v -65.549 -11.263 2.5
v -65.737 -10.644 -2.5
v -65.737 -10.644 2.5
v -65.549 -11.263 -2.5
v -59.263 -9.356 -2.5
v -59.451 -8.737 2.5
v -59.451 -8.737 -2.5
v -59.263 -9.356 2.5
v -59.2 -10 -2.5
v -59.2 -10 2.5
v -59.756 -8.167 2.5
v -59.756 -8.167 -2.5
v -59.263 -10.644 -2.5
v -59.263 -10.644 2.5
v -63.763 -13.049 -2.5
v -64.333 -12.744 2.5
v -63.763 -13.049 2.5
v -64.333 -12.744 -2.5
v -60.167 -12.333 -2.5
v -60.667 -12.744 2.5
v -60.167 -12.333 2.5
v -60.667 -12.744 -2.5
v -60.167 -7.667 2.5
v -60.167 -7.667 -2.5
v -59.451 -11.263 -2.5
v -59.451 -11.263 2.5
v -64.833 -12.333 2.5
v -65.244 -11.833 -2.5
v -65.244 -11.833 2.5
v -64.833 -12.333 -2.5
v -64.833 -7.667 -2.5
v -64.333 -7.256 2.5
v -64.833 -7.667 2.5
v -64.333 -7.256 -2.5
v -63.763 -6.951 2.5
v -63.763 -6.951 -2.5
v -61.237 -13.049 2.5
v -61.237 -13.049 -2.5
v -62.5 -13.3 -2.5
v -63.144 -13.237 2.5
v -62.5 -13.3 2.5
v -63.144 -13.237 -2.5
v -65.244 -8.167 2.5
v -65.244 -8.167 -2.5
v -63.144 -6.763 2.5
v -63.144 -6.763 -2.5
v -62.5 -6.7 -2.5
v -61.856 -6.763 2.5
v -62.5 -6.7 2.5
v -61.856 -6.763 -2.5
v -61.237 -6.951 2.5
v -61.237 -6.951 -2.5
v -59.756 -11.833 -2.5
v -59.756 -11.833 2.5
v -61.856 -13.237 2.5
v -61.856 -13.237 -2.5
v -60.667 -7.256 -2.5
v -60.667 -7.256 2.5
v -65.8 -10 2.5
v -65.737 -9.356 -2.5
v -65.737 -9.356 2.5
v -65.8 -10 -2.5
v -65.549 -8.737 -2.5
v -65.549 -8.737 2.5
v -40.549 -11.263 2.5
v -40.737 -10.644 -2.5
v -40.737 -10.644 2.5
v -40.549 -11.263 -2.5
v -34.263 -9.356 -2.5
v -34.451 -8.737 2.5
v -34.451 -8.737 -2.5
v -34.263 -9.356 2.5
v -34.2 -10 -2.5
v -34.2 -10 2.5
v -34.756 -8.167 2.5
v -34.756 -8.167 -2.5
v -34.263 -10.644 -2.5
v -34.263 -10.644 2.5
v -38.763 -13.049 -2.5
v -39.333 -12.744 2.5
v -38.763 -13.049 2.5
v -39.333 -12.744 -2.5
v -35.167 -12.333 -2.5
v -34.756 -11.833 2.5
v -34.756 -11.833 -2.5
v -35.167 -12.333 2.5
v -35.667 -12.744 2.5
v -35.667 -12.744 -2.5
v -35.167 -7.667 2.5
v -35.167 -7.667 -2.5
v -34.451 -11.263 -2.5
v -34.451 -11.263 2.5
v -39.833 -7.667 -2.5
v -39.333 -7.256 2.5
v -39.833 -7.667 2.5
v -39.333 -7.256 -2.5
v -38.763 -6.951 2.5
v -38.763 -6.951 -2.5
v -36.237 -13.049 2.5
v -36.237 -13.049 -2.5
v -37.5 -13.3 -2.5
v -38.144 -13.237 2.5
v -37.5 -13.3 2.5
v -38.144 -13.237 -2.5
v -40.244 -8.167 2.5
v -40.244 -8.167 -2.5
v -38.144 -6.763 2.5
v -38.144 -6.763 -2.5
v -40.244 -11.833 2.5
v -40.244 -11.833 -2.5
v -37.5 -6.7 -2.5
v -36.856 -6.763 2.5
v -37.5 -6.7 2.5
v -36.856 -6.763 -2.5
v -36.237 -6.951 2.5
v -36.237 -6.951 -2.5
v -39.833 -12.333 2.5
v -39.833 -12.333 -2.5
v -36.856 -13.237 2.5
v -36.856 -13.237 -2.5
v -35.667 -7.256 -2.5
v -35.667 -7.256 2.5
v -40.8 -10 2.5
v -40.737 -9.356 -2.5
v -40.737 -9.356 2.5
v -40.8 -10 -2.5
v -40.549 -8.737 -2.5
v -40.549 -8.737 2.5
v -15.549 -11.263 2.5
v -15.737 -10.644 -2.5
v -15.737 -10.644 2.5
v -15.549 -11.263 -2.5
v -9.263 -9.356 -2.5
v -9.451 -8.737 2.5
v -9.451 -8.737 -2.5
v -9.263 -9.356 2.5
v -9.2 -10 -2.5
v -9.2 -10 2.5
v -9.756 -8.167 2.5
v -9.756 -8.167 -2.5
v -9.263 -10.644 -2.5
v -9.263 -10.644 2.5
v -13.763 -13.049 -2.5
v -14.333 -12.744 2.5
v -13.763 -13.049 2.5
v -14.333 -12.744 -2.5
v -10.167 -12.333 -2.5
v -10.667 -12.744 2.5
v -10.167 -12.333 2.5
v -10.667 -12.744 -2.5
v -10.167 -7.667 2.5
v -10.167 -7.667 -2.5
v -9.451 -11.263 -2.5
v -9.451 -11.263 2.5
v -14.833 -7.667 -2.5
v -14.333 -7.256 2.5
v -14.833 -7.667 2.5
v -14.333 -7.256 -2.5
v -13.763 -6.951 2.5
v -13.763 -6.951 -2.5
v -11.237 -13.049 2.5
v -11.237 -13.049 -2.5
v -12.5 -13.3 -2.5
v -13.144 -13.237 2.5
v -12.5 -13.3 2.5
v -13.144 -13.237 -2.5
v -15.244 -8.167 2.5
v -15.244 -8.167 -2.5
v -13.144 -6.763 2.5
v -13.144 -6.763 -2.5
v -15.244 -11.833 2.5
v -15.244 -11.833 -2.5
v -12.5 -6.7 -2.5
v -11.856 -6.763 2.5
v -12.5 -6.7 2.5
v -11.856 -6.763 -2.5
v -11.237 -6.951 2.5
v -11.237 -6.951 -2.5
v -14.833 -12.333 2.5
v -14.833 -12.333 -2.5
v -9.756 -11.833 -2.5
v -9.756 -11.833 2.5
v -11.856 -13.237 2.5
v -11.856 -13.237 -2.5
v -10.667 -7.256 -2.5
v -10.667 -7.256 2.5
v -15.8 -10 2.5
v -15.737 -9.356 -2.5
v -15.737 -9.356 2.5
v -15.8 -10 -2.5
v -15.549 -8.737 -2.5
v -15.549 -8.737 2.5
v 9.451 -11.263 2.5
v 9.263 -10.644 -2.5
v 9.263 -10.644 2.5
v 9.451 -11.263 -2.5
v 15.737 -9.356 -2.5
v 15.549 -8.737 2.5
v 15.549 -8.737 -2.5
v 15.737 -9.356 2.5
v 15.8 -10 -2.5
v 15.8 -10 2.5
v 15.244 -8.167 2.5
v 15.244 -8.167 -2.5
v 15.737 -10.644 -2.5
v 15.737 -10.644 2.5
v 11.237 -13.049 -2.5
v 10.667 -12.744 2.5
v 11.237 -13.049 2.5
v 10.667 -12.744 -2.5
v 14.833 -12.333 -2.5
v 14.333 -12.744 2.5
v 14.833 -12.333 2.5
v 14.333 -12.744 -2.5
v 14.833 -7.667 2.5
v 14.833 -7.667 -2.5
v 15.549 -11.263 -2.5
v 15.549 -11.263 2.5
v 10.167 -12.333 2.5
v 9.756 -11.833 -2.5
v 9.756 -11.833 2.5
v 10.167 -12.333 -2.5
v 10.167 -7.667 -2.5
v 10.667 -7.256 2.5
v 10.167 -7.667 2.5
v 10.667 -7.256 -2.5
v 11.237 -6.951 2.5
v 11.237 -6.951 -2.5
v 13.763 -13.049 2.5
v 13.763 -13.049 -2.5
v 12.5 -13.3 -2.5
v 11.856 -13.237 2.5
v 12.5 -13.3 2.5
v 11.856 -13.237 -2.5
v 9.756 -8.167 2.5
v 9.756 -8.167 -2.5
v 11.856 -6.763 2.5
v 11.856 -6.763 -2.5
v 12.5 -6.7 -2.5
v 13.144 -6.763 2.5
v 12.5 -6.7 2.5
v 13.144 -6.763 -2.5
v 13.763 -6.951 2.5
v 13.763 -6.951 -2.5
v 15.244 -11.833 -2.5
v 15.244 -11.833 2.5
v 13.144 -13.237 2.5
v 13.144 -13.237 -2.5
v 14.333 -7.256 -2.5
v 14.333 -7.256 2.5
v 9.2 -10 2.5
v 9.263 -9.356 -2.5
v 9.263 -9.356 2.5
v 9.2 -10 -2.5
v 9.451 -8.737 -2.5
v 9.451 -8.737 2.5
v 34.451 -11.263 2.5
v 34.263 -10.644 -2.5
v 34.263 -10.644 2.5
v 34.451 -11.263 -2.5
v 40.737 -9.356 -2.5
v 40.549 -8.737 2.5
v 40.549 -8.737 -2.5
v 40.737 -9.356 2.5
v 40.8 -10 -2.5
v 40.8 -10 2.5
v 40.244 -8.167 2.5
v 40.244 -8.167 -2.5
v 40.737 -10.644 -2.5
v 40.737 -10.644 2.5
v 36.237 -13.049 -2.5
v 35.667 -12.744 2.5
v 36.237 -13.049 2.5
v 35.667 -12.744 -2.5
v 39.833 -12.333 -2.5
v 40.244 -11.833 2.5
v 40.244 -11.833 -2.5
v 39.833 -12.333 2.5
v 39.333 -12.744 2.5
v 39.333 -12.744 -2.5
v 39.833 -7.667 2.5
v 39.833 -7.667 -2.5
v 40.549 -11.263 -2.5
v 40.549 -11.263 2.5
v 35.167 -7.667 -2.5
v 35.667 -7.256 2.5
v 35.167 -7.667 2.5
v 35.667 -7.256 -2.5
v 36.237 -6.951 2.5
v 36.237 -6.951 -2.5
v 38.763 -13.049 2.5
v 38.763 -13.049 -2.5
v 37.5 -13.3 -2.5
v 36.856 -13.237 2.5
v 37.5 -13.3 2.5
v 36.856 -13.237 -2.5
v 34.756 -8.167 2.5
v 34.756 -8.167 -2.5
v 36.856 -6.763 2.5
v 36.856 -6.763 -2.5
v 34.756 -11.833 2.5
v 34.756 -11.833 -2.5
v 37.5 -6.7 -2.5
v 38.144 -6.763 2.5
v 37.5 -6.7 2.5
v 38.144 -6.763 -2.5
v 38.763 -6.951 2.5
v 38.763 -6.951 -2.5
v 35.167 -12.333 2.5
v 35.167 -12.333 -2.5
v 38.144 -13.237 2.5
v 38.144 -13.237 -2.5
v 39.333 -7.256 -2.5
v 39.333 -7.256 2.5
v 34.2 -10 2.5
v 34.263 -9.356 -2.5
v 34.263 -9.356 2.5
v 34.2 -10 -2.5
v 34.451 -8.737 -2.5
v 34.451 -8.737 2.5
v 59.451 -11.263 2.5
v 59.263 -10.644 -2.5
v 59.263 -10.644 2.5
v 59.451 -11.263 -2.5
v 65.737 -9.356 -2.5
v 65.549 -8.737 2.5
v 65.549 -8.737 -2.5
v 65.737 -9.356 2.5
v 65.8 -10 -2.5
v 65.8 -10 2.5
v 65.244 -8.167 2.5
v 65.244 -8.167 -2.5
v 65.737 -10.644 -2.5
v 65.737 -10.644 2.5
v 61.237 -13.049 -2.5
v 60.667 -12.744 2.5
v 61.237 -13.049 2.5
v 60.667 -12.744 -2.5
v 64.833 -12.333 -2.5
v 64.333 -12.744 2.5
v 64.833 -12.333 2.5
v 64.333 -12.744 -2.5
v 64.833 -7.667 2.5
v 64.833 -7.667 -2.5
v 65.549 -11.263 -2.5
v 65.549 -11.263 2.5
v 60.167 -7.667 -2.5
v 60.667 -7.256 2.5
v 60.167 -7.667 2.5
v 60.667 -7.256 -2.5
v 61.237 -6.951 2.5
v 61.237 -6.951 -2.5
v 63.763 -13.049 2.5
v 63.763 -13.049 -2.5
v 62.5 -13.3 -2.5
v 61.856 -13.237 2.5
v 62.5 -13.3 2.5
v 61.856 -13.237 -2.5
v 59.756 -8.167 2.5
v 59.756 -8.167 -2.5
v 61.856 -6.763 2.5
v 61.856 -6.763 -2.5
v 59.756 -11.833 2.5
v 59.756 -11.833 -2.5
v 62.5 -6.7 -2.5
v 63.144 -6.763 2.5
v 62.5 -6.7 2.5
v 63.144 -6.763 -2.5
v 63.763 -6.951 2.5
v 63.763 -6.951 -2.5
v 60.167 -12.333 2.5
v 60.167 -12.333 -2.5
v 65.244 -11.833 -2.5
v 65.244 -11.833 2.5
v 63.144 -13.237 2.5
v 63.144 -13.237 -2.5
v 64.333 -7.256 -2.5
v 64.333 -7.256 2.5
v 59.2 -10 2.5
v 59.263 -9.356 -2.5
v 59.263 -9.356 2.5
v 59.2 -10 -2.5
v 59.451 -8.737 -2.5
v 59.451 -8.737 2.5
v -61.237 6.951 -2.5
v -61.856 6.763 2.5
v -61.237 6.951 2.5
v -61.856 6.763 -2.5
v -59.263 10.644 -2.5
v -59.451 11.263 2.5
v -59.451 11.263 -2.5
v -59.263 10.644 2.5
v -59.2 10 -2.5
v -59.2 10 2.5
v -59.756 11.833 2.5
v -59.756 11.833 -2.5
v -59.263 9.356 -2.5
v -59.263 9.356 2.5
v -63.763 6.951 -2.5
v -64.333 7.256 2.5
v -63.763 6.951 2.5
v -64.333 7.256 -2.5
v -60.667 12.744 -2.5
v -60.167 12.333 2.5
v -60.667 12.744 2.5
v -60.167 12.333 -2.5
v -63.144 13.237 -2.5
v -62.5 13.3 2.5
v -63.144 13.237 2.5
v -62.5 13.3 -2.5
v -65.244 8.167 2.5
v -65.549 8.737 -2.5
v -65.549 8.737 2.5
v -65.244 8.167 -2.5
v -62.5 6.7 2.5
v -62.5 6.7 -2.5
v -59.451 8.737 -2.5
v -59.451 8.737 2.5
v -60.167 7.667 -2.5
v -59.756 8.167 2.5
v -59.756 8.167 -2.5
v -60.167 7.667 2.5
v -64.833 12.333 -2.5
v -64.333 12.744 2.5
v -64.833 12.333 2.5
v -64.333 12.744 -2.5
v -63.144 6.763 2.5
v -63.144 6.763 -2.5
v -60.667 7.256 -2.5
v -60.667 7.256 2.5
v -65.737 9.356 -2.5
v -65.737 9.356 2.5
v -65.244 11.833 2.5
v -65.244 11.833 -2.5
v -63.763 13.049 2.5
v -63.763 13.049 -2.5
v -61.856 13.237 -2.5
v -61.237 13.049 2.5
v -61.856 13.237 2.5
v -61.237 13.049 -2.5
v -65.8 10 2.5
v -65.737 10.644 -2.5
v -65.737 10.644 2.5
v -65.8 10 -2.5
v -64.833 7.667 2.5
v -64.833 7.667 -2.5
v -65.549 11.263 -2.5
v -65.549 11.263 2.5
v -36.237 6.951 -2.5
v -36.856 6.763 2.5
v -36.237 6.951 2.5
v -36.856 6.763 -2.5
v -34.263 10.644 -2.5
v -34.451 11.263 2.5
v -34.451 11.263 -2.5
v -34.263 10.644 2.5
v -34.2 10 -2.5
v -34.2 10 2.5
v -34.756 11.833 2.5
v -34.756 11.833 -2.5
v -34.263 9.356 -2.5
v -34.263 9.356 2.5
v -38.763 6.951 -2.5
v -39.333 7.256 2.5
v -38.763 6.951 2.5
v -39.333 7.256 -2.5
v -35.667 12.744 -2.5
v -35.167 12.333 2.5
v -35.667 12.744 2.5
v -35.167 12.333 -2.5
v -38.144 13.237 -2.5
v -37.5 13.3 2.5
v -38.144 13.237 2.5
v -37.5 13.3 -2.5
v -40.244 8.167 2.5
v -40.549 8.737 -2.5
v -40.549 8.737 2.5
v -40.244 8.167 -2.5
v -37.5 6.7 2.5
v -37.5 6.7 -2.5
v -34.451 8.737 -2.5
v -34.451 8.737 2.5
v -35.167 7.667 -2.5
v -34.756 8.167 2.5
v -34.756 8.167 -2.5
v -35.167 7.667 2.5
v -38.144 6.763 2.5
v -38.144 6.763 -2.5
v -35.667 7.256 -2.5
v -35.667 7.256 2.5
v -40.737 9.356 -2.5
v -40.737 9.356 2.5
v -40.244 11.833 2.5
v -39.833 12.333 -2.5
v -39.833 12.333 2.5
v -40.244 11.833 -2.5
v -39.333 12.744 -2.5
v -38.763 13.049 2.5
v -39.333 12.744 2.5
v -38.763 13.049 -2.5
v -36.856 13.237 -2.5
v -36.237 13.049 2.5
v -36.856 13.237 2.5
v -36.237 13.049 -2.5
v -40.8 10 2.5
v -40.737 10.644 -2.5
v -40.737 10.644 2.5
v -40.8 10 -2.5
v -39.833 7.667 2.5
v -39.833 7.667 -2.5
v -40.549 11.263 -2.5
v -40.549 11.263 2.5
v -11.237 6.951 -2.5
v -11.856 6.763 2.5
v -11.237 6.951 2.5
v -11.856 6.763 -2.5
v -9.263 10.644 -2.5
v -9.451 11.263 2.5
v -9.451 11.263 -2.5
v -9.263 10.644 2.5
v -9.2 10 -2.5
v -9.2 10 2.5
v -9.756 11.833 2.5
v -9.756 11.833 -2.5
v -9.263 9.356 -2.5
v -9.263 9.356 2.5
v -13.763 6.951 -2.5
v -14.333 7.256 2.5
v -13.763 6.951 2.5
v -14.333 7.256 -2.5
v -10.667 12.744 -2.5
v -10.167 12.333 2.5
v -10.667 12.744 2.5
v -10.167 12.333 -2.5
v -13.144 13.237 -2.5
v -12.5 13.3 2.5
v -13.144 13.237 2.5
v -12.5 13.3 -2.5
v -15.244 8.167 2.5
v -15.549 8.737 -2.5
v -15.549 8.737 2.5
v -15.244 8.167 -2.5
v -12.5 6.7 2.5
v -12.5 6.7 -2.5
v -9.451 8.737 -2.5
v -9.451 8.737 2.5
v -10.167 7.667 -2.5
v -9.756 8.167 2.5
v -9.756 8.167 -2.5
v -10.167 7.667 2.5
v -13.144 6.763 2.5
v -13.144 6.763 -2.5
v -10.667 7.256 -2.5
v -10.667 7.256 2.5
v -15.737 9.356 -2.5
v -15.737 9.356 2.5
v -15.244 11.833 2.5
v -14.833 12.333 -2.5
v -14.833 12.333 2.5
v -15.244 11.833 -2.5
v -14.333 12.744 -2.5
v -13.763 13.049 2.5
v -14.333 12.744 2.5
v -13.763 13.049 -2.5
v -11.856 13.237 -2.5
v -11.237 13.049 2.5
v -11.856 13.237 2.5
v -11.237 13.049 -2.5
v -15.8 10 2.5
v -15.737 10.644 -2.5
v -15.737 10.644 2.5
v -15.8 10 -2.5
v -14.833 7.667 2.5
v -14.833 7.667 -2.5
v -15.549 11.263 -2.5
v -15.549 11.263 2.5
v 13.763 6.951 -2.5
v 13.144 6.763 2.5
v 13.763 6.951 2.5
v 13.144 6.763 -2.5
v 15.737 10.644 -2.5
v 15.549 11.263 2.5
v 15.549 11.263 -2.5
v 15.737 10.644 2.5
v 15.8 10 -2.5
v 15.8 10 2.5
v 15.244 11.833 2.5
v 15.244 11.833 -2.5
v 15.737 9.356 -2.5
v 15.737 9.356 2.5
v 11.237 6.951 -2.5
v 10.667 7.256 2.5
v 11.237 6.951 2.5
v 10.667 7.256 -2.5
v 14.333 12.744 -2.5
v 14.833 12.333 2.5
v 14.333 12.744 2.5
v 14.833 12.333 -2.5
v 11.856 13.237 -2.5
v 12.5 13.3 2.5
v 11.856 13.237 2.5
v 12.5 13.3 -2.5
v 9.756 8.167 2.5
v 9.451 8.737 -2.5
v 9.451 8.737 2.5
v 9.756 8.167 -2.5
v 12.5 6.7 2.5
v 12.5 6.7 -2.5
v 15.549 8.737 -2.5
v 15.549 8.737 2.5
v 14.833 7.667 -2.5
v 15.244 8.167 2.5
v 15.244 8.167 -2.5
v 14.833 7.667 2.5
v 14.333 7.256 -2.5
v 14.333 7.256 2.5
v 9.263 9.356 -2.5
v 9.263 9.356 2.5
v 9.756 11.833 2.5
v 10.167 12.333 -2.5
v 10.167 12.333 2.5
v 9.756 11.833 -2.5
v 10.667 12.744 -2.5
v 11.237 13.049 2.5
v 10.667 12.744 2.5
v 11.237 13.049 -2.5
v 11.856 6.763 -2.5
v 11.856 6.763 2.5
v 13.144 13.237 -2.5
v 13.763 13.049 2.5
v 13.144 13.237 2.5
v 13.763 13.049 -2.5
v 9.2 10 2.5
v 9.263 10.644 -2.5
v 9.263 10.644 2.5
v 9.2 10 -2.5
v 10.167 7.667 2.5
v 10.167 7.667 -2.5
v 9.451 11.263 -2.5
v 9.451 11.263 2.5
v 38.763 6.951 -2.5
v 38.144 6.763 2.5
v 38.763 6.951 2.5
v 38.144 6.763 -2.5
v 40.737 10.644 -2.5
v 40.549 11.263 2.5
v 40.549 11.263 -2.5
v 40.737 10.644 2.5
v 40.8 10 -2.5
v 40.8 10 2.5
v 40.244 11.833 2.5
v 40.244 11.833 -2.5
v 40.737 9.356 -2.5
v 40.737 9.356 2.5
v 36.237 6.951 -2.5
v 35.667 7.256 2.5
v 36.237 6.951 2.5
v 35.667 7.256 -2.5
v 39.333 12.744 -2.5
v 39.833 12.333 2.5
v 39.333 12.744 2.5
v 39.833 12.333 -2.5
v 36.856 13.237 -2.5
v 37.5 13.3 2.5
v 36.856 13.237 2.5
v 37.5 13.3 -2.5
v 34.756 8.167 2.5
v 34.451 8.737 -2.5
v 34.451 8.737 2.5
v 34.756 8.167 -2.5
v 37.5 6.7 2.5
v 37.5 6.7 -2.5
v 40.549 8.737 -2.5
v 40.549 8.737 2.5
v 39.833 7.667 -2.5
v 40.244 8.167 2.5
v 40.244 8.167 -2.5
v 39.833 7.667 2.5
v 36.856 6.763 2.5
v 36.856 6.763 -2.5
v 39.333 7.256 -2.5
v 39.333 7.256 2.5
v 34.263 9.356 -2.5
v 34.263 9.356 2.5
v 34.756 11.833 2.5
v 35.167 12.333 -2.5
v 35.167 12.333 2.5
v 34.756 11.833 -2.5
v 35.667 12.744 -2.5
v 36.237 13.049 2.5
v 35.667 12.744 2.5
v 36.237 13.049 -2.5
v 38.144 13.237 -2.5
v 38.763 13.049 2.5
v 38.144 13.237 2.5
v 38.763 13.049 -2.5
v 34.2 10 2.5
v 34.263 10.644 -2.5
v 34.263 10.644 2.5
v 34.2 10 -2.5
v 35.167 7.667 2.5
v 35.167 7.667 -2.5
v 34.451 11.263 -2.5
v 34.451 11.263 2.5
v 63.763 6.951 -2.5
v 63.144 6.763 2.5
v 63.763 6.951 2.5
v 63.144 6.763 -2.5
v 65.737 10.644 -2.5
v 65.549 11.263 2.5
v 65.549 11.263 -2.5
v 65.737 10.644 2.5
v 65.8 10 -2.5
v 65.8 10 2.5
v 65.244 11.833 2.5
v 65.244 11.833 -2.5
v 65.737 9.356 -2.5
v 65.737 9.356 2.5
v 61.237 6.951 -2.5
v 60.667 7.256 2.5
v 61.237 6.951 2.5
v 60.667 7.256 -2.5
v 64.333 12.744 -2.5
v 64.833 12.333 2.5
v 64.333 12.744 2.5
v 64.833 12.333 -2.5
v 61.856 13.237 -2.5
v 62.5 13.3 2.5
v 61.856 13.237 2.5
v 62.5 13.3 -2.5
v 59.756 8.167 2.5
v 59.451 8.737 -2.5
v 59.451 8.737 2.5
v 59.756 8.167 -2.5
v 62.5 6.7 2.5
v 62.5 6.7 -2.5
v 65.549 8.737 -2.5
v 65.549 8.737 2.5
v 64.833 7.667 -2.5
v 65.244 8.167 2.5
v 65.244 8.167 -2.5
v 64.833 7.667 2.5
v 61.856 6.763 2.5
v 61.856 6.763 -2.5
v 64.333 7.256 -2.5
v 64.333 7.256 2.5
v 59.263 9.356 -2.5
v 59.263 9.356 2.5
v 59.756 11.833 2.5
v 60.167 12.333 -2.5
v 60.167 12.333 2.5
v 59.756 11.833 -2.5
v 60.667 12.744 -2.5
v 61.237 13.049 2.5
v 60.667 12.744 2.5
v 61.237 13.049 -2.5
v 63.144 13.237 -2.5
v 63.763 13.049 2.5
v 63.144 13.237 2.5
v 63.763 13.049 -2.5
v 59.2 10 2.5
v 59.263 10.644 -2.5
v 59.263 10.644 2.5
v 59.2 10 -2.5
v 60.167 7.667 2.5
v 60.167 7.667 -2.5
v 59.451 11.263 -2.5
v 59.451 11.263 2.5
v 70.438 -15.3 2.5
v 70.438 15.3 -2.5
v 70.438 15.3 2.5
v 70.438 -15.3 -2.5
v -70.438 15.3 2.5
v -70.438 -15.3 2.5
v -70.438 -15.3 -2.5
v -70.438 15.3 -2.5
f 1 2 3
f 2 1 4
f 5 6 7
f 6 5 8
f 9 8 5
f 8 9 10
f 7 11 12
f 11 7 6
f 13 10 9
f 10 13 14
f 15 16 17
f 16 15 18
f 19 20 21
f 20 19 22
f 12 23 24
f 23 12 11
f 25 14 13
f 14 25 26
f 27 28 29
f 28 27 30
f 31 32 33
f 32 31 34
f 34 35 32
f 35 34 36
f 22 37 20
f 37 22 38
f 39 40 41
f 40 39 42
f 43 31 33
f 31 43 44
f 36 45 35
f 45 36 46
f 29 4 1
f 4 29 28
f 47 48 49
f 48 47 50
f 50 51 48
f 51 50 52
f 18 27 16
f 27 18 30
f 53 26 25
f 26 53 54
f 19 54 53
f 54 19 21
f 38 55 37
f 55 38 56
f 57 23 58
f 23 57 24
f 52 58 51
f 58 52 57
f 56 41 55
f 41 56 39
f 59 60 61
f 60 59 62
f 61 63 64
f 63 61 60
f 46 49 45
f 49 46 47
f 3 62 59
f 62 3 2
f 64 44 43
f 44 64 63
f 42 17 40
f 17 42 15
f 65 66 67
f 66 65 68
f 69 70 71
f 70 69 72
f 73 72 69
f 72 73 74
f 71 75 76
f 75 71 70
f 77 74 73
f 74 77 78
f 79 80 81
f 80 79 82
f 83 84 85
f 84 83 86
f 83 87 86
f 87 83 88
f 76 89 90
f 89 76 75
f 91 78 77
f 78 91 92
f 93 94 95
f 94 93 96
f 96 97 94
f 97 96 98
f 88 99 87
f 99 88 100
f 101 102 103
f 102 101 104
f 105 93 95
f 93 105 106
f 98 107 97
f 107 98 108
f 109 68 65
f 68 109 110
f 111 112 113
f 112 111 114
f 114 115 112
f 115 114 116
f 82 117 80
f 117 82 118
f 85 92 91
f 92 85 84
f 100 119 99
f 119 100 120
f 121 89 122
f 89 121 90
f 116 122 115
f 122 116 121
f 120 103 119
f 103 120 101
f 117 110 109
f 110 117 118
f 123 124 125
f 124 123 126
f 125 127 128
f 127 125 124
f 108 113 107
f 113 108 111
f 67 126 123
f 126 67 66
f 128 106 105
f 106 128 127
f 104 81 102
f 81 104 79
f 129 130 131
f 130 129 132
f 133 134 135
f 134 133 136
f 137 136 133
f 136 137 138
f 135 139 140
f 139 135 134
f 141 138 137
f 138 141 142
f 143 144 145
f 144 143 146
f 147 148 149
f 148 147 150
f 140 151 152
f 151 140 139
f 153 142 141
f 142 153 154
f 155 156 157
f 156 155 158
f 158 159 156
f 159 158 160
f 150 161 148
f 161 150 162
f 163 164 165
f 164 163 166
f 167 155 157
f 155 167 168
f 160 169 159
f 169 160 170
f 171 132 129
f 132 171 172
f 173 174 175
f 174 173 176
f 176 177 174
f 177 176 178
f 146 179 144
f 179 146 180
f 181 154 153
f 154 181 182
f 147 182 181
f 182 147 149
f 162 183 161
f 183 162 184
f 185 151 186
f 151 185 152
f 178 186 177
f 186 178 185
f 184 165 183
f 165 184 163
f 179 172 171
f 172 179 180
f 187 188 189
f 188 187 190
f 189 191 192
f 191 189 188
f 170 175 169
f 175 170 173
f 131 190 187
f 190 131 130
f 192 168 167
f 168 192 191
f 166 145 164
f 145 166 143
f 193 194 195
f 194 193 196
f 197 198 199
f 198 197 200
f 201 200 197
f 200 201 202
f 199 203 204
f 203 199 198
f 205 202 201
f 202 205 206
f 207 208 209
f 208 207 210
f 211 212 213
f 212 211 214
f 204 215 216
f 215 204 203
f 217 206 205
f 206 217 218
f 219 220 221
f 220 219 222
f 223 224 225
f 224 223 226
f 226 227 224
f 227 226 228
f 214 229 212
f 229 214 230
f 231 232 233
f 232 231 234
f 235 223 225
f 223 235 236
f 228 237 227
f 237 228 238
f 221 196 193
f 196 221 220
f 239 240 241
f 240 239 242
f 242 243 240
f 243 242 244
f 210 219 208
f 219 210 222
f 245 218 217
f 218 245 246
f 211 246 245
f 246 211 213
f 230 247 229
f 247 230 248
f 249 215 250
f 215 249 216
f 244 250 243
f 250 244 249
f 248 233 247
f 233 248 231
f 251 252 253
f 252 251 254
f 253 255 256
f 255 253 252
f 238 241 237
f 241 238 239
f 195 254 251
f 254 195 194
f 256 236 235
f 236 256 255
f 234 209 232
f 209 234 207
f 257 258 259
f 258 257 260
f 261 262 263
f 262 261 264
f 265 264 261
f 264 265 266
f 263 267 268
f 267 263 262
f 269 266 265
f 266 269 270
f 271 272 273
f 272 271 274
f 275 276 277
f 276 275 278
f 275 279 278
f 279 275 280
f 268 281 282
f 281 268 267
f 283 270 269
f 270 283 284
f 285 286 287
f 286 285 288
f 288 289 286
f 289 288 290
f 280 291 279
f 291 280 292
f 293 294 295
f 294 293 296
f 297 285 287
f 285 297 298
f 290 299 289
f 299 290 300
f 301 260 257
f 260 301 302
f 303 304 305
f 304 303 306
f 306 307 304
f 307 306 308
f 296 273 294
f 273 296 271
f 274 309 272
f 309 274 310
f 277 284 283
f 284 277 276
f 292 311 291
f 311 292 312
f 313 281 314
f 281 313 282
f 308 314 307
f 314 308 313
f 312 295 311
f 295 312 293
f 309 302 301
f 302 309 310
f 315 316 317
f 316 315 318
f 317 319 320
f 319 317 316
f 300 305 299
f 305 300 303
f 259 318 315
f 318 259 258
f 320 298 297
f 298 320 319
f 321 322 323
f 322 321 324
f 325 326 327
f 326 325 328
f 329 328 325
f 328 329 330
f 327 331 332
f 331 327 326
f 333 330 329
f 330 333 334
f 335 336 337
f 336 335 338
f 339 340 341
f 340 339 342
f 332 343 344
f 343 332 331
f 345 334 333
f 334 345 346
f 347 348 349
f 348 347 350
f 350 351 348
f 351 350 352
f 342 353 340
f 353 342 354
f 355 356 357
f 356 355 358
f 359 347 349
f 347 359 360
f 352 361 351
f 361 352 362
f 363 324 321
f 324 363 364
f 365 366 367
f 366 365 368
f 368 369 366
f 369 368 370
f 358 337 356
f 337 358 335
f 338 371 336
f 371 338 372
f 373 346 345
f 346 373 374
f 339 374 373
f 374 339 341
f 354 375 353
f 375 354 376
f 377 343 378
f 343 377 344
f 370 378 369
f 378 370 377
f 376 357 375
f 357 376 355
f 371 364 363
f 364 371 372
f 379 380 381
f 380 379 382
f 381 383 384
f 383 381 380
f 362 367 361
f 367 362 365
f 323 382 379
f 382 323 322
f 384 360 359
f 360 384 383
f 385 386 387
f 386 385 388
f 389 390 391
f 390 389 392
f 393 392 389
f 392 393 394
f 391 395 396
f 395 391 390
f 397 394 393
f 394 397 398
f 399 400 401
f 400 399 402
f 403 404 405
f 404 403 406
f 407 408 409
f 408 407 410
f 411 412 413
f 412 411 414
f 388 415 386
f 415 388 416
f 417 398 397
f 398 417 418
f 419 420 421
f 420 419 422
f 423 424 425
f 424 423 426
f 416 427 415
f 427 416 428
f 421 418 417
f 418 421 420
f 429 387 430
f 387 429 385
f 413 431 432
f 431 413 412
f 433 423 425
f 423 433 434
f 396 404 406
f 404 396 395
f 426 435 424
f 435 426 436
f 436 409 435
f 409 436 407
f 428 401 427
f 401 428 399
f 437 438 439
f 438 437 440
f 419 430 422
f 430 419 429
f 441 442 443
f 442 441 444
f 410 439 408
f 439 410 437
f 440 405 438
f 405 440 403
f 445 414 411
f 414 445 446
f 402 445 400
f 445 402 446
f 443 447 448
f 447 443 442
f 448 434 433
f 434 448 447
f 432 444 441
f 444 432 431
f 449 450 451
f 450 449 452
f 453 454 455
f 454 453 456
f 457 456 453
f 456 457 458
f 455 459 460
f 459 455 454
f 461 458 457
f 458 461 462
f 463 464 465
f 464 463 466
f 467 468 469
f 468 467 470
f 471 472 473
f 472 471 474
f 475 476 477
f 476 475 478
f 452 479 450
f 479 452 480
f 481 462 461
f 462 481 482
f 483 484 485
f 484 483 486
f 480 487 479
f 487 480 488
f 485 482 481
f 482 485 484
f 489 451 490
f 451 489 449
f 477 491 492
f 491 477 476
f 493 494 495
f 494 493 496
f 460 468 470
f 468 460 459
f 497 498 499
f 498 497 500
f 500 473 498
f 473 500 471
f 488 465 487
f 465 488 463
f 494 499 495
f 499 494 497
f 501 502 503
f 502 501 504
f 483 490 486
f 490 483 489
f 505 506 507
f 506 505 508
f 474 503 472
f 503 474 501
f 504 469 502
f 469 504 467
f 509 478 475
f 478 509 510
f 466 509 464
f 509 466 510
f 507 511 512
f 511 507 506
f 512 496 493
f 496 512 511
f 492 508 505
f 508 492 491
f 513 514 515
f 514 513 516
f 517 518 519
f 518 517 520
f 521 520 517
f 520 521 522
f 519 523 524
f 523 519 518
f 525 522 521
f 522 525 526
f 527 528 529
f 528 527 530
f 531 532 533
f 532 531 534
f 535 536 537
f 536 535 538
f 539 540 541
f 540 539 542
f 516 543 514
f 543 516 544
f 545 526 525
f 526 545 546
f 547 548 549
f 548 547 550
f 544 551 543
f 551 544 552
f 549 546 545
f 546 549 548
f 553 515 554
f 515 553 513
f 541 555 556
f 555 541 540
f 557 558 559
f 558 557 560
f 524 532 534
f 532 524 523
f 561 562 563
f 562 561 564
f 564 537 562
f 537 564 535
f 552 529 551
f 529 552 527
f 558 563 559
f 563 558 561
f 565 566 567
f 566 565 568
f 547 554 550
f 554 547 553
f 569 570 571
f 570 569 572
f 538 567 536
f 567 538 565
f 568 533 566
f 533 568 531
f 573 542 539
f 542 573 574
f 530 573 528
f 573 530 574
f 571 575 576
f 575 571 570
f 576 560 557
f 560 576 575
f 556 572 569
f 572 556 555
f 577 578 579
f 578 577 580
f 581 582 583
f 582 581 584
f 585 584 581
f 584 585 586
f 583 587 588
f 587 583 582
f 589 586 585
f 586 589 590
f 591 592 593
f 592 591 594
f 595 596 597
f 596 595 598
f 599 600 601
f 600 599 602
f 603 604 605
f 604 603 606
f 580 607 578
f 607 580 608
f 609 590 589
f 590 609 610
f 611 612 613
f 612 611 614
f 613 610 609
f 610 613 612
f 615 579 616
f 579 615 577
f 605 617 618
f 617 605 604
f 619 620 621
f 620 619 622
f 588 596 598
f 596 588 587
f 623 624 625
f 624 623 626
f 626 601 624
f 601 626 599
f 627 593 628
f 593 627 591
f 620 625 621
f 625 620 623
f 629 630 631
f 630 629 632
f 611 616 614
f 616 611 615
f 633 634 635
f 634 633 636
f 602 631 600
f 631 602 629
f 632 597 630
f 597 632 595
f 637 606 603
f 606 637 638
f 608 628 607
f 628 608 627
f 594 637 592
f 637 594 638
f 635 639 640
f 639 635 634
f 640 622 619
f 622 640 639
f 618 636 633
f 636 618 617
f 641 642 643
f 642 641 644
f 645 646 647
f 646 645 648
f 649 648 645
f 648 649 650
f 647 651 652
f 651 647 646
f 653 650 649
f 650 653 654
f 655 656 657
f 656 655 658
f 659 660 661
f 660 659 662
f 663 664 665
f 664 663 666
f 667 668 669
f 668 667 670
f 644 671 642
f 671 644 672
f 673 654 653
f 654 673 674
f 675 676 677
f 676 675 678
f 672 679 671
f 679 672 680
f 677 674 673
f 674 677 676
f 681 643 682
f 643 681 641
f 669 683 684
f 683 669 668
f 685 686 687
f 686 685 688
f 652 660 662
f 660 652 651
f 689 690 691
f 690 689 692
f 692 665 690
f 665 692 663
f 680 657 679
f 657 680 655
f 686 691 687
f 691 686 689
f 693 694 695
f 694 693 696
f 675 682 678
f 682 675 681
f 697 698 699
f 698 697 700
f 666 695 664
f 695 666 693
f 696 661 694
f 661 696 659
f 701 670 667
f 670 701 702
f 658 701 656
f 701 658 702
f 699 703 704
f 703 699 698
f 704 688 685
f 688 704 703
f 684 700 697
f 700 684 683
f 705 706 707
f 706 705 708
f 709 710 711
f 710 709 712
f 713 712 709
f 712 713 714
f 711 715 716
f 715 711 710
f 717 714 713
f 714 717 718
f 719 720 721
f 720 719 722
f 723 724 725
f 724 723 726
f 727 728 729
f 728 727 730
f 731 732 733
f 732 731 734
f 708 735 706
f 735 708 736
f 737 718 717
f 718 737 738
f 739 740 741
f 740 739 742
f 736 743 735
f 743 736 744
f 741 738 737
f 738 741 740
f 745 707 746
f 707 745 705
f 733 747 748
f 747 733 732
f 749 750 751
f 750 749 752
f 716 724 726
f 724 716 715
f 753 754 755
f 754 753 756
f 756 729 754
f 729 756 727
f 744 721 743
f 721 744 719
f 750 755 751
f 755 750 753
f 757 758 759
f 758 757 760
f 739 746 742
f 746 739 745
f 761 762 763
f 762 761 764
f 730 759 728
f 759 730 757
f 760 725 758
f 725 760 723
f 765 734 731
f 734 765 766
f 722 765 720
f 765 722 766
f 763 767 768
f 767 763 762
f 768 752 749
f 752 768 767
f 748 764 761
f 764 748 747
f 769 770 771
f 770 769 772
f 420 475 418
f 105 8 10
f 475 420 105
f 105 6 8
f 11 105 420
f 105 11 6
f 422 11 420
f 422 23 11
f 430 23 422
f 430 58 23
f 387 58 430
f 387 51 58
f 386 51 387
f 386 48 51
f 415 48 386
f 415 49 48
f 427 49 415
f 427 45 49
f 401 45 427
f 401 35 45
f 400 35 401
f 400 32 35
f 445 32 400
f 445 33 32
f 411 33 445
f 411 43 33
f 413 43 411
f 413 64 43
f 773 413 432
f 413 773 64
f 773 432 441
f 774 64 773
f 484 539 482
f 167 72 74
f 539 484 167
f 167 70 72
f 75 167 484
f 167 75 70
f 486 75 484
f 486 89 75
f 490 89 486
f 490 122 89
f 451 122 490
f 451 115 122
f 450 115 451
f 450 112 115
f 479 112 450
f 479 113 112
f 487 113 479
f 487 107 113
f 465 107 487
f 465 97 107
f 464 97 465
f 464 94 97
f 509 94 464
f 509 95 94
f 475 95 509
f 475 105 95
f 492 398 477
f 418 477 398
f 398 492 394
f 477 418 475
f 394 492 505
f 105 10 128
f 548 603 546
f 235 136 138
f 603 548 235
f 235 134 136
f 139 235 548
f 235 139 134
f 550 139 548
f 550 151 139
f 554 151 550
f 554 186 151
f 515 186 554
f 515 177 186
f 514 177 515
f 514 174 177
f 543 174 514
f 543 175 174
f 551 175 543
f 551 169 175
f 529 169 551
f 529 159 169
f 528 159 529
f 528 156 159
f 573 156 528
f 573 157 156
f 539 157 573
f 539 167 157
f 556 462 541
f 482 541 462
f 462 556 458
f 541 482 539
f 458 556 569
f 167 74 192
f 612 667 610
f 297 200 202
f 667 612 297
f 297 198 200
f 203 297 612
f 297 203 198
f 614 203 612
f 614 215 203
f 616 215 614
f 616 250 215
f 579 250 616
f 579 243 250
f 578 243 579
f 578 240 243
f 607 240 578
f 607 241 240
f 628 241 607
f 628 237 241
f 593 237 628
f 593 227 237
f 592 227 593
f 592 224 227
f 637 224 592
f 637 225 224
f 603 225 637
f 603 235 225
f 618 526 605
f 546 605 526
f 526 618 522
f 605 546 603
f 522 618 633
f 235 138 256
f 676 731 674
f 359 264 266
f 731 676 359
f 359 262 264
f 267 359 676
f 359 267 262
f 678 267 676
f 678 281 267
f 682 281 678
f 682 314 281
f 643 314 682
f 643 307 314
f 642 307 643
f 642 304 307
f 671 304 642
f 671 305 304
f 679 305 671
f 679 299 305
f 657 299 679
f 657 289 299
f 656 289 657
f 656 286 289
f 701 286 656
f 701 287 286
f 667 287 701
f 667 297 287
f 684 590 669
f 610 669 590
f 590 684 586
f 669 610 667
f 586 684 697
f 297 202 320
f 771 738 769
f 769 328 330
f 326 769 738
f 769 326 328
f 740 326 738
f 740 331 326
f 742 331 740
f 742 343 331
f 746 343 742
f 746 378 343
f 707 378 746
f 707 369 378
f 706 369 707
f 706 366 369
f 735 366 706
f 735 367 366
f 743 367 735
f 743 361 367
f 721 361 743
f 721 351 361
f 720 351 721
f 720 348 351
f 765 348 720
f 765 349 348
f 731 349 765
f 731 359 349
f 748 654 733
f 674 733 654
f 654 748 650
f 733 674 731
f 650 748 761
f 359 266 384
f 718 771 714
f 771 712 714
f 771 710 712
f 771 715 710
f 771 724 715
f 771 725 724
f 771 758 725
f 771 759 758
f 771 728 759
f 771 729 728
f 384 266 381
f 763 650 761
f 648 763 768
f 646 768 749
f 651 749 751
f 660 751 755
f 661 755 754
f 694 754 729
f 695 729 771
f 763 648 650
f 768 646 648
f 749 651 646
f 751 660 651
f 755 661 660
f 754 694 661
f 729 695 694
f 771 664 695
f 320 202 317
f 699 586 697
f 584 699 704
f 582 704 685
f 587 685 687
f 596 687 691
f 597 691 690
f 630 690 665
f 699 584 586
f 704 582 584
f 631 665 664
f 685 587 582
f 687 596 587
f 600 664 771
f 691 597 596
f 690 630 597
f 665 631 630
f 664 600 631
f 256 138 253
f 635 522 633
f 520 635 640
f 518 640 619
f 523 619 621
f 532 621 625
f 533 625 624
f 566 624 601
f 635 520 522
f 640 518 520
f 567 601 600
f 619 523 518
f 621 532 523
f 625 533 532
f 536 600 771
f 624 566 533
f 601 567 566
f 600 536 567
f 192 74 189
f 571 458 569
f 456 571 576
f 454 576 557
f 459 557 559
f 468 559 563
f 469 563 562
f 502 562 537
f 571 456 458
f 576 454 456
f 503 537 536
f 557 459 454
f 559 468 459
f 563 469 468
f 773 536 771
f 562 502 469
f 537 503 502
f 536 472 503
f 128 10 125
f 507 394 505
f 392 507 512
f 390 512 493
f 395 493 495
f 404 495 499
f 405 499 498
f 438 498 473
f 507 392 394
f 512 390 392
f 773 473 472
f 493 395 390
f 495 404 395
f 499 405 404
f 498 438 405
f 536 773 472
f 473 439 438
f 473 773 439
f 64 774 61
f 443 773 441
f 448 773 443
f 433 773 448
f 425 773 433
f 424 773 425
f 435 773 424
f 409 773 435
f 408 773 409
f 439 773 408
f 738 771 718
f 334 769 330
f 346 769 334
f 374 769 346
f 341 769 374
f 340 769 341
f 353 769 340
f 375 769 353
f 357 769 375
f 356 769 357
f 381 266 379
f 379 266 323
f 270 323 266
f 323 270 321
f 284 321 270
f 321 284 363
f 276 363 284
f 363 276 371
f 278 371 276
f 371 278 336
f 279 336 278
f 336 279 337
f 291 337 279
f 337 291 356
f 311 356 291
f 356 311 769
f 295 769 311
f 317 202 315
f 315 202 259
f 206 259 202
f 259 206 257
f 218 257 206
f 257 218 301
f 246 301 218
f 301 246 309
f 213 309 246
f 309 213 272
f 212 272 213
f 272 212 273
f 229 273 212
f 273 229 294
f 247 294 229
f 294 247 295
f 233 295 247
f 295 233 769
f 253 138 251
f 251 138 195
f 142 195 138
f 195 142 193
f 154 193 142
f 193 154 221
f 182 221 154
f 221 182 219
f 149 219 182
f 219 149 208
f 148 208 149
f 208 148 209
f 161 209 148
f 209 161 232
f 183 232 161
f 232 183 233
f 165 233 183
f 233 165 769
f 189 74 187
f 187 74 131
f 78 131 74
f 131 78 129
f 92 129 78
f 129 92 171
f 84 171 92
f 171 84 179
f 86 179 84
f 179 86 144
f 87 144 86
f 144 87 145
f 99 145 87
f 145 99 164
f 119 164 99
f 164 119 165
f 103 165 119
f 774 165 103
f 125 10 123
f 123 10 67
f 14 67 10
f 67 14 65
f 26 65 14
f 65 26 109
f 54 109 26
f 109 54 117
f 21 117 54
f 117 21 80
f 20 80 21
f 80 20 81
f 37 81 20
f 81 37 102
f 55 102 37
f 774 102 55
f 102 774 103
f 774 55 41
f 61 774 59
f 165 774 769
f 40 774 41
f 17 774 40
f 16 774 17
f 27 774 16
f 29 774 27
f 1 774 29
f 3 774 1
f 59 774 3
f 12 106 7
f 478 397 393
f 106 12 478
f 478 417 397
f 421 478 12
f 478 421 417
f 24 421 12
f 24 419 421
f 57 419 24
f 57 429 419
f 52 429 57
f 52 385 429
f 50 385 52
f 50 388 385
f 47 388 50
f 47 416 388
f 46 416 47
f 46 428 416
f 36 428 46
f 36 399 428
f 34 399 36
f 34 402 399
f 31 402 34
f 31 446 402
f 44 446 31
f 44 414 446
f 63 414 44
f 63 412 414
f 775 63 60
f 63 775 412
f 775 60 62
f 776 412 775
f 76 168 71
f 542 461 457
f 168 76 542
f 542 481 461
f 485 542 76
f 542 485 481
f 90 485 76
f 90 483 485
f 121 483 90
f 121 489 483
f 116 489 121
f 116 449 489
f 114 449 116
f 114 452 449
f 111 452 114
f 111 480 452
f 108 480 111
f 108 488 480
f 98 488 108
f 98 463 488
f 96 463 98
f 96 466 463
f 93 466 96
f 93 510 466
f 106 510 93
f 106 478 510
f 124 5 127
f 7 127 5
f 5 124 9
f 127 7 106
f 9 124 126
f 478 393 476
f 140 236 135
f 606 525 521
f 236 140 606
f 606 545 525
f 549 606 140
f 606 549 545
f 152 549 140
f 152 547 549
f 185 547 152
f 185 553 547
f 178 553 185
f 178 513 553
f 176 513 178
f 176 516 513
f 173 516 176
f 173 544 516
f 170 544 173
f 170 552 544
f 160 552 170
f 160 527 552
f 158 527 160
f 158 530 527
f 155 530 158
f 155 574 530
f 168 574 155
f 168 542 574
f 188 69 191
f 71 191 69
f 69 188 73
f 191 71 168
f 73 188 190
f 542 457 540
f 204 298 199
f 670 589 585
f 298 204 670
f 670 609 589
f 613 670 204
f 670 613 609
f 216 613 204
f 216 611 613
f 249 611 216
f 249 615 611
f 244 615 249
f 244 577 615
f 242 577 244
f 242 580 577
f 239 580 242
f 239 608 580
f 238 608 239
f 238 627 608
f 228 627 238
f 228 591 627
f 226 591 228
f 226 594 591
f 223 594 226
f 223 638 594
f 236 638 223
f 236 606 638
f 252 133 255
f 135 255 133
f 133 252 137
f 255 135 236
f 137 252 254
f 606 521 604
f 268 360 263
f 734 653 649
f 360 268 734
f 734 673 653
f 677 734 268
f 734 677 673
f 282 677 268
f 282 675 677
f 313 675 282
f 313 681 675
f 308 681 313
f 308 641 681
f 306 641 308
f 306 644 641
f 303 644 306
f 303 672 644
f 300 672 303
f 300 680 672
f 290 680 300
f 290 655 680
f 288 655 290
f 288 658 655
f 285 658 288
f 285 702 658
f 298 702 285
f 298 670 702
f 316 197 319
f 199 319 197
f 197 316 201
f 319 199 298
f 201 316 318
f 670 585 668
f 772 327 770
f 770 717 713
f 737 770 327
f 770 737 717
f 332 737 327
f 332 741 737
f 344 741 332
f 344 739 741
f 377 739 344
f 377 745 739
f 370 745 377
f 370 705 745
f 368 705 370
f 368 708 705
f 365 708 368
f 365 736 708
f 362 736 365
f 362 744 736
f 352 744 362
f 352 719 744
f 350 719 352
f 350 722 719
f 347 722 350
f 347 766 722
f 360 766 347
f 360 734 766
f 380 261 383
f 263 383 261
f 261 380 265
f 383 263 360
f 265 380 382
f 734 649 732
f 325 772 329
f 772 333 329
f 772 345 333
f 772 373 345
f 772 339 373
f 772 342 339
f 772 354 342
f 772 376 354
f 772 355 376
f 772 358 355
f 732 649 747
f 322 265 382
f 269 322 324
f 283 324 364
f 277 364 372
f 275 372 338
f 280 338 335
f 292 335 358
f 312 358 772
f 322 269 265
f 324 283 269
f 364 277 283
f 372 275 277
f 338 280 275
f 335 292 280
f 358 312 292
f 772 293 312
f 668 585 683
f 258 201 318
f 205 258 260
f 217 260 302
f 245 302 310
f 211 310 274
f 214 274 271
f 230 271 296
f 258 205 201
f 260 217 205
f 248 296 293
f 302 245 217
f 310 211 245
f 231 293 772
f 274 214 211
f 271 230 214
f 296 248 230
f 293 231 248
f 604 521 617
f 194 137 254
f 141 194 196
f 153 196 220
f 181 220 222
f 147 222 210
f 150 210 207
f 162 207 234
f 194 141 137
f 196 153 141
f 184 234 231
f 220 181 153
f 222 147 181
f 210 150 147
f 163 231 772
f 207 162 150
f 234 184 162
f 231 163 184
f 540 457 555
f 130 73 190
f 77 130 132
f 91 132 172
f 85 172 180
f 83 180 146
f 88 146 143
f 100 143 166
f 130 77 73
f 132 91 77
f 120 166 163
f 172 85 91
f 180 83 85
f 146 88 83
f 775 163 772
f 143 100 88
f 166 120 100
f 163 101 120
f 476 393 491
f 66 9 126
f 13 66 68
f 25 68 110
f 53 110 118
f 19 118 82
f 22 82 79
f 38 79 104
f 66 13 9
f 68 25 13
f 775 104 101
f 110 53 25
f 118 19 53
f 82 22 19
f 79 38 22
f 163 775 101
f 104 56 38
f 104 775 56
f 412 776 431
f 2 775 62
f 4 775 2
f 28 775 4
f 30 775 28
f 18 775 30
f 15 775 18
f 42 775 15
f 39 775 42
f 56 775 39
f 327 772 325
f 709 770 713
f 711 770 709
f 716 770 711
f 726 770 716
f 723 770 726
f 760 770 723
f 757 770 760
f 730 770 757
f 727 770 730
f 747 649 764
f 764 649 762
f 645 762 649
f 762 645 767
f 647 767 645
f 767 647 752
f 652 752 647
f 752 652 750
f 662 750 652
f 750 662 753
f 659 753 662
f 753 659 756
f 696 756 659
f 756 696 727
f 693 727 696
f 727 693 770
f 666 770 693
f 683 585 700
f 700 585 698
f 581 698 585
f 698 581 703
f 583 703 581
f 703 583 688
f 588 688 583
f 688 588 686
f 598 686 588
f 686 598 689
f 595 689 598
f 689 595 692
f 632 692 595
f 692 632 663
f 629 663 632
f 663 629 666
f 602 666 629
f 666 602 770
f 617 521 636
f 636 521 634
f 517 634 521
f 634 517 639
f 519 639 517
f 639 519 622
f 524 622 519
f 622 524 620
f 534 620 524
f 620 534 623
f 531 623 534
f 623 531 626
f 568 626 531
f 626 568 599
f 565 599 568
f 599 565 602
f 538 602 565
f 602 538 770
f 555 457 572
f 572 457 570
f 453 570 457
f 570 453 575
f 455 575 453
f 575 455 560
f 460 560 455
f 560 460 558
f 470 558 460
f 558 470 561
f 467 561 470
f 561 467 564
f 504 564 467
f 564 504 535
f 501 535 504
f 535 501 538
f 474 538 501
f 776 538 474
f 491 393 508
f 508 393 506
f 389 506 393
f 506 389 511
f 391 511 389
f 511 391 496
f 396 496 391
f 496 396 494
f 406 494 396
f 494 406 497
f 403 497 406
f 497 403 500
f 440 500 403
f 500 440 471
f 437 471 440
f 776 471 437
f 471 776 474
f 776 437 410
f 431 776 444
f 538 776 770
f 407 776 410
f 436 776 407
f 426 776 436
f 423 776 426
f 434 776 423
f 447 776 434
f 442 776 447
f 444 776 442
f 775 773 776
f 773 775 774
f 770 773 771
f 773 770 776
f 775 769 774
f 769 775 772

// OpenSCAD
$fn = 32;

// ----------------------------------------------------------------------
// Hole bar, 6 x Ø6.6
// tworows layout, 7.9375 mm edge offset
// ----------------------------------------------------------------------

// --- parameters (mm) ---
bar_w = 30.6;     // bar width (Y)
bar_t = 5;        // bar thickness (Z)
holes = 6;        // holes per row
hole_d = 6.6;     // hole diameter
edge = 7.938;     // offset from the bar end to the first hole
pitch = 25;       // pitch between neighbouring holes
row_offset = 20;  // distance between the two rows

// --- derived feature positions (mm) ---
span = (holes - 1) * pitch;   // = 125   distance between the end holes
bar_l = span + 2 * edge;      // = 140.88   overall bar length
start_x = -bar_l / 2 + edge;  // = -62.5   X of the first hole
feature_centers = [
  [start_x + 0 * pitch, -row_offset / 2],
  [start_x + 1 * pitch, -row_offset / 2],
  [start_x + 2 * pitch, -row_offset / 2],
  [start_x + 3 * pitch, -row_offset / 2],
  [start_x + 4 * pitch, -row_offset / 2],
  [start_x + 5 * pitch, -row_offset / 2]
];   // hole centres of the first row
row2_centers = [
  [start_x + 0 * pitch, row_offset / 2],
  [start_x + 1 * pitch, row_offset / 2],
  [start_x + 2 * pitch, row_offset / 2],
  [start_x + 3 * pitch, row_offset / 2],
  [start_x + 4 * pitch, row_offset / 2],
  [start_x + 5 * pitch, row_offset / 2]
];   // hole centres of the second row

// bar with two rows of holes, both read from their own centre arrays
difference() {
  translate([-bar_l / 2, -bar_w / 2, -bar_t / 2]) cube([bar_l, bar_w, bar_t]);
  for (centre = feature_centers)
    translate([centre[0], centre[1], 0])
      cylinder(d = hole_d, h = bar_t + 2, center = true);
  for (centre = row2_centers)
    translate([centre[0], centre[1], 0])
      cylinder(d = hole_d, h = bar_t + 2, center = true);
}
